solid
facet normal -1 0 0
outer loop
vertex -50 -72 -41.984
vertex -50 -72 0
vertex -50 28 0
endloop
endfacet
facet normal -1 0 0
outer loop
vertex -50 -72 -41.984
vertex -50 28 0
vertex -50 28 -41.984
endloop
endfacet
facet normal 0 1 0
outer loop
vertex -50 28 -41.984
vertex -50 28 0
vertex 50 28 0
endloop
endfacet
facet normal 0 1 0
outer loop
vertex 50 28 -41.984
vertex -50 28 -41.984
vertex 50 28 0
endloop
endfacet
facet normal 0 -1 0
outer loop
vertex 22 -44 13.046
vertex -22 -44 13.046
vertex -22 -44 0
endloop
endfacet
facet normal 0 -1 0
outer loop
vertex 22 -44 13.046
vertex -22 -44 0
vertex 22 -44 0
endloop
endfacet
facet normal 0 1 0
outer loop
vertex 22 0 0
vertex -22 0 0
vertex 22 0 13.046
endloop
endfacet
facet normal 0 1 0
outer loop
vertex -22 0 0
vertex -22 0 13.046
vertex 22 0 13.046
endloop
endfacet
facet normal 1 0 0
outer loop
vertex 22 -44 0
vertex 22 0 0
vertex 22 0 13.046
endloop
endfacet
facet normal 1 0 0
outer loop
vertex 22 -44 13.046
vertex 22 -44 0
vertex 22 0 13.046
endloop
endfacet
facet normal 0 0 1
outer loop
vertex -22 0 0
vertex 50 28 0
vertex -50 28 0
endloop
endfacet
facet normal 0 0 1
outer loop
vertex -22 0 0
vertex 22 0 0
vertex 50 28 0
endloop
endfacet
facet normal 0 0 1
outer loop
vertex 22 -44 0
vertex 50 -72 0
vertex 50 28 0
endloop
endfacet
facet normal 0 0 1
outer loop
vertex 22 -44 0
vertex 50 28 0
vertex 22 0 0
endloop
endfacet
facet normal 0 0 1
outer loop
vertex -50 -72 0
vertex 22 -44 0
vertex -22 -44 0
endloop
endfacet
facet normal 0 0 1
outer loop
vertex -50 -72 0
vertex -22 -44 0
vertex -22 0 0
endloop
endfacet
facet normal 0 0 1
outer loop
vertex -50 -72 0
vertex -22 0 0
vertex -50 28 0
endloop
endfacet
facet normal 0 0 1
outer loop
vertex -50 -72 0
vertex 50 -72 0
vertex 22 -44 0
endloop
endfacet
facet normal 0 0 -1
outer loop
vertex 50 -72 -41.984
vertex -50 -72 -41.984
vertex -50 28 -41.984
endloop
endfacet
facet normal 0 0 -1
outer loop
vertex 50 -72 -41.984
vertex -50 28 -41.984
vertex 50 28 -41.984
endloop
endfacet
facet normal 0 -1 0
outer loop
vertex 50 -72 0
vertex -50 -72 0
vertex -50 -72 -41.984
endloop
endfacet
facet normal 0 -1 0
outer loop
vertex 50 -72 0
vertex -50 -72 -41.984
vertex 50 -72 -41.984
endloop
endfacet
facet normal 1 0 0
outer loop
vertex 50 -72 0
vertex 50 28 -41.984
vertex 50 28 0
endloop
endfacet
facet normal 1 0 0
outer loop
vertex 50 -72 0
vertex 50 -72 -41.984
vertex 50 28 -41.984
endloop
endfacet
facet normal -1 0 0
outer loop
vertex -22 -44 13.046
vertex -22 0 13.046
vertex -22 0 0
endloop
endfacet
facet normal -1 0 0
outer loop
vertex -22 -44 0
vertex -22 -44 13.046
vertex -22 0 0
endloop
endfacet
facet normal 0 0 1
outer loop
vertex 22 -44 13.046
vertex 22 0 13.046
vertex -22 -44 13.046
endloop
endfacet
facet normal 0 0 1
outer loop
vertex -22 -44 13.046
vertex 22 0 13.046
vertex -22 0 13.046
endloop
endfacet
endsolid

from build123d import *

# Parameters (mm, degrees)
F1_DEPTH = 44
F2_DEPTH = 72
F3_DEPTH = 28


with BuildPart() as f1:
    # F0 (on Front) → F1 (new body)
    with BuildSketch(Plane.XZ):
        Polygon((22, 13.045934), (0, 13.045934), (-22, 13.045934), (-22, 0), (22, 0), align=None)
    extrude(amount=F1_DEPTH)

    # F0 (on Front) → F2 (join)
    with BuildSketch(Plane.XZ):
        Polygon((50, 0), (22, 0), (-22, 0), (-50, 0), (-50, -41.984189), (0, -41.984189), (50, -41.984189), align=None)
    extrude(amount=F2_DEPTH)

    # F0 (on Front) → F3 (join)
    with BuildSketch(Plane.XZ):
        Polygon((50, 0), (22, 0), (-22, 0), (-50, 0), (-50, -41.984189), (0, -41.984189), (50, -41.984189), align=None)
    extrude(amount=-F3_DEPTH)


solid = f1.part
